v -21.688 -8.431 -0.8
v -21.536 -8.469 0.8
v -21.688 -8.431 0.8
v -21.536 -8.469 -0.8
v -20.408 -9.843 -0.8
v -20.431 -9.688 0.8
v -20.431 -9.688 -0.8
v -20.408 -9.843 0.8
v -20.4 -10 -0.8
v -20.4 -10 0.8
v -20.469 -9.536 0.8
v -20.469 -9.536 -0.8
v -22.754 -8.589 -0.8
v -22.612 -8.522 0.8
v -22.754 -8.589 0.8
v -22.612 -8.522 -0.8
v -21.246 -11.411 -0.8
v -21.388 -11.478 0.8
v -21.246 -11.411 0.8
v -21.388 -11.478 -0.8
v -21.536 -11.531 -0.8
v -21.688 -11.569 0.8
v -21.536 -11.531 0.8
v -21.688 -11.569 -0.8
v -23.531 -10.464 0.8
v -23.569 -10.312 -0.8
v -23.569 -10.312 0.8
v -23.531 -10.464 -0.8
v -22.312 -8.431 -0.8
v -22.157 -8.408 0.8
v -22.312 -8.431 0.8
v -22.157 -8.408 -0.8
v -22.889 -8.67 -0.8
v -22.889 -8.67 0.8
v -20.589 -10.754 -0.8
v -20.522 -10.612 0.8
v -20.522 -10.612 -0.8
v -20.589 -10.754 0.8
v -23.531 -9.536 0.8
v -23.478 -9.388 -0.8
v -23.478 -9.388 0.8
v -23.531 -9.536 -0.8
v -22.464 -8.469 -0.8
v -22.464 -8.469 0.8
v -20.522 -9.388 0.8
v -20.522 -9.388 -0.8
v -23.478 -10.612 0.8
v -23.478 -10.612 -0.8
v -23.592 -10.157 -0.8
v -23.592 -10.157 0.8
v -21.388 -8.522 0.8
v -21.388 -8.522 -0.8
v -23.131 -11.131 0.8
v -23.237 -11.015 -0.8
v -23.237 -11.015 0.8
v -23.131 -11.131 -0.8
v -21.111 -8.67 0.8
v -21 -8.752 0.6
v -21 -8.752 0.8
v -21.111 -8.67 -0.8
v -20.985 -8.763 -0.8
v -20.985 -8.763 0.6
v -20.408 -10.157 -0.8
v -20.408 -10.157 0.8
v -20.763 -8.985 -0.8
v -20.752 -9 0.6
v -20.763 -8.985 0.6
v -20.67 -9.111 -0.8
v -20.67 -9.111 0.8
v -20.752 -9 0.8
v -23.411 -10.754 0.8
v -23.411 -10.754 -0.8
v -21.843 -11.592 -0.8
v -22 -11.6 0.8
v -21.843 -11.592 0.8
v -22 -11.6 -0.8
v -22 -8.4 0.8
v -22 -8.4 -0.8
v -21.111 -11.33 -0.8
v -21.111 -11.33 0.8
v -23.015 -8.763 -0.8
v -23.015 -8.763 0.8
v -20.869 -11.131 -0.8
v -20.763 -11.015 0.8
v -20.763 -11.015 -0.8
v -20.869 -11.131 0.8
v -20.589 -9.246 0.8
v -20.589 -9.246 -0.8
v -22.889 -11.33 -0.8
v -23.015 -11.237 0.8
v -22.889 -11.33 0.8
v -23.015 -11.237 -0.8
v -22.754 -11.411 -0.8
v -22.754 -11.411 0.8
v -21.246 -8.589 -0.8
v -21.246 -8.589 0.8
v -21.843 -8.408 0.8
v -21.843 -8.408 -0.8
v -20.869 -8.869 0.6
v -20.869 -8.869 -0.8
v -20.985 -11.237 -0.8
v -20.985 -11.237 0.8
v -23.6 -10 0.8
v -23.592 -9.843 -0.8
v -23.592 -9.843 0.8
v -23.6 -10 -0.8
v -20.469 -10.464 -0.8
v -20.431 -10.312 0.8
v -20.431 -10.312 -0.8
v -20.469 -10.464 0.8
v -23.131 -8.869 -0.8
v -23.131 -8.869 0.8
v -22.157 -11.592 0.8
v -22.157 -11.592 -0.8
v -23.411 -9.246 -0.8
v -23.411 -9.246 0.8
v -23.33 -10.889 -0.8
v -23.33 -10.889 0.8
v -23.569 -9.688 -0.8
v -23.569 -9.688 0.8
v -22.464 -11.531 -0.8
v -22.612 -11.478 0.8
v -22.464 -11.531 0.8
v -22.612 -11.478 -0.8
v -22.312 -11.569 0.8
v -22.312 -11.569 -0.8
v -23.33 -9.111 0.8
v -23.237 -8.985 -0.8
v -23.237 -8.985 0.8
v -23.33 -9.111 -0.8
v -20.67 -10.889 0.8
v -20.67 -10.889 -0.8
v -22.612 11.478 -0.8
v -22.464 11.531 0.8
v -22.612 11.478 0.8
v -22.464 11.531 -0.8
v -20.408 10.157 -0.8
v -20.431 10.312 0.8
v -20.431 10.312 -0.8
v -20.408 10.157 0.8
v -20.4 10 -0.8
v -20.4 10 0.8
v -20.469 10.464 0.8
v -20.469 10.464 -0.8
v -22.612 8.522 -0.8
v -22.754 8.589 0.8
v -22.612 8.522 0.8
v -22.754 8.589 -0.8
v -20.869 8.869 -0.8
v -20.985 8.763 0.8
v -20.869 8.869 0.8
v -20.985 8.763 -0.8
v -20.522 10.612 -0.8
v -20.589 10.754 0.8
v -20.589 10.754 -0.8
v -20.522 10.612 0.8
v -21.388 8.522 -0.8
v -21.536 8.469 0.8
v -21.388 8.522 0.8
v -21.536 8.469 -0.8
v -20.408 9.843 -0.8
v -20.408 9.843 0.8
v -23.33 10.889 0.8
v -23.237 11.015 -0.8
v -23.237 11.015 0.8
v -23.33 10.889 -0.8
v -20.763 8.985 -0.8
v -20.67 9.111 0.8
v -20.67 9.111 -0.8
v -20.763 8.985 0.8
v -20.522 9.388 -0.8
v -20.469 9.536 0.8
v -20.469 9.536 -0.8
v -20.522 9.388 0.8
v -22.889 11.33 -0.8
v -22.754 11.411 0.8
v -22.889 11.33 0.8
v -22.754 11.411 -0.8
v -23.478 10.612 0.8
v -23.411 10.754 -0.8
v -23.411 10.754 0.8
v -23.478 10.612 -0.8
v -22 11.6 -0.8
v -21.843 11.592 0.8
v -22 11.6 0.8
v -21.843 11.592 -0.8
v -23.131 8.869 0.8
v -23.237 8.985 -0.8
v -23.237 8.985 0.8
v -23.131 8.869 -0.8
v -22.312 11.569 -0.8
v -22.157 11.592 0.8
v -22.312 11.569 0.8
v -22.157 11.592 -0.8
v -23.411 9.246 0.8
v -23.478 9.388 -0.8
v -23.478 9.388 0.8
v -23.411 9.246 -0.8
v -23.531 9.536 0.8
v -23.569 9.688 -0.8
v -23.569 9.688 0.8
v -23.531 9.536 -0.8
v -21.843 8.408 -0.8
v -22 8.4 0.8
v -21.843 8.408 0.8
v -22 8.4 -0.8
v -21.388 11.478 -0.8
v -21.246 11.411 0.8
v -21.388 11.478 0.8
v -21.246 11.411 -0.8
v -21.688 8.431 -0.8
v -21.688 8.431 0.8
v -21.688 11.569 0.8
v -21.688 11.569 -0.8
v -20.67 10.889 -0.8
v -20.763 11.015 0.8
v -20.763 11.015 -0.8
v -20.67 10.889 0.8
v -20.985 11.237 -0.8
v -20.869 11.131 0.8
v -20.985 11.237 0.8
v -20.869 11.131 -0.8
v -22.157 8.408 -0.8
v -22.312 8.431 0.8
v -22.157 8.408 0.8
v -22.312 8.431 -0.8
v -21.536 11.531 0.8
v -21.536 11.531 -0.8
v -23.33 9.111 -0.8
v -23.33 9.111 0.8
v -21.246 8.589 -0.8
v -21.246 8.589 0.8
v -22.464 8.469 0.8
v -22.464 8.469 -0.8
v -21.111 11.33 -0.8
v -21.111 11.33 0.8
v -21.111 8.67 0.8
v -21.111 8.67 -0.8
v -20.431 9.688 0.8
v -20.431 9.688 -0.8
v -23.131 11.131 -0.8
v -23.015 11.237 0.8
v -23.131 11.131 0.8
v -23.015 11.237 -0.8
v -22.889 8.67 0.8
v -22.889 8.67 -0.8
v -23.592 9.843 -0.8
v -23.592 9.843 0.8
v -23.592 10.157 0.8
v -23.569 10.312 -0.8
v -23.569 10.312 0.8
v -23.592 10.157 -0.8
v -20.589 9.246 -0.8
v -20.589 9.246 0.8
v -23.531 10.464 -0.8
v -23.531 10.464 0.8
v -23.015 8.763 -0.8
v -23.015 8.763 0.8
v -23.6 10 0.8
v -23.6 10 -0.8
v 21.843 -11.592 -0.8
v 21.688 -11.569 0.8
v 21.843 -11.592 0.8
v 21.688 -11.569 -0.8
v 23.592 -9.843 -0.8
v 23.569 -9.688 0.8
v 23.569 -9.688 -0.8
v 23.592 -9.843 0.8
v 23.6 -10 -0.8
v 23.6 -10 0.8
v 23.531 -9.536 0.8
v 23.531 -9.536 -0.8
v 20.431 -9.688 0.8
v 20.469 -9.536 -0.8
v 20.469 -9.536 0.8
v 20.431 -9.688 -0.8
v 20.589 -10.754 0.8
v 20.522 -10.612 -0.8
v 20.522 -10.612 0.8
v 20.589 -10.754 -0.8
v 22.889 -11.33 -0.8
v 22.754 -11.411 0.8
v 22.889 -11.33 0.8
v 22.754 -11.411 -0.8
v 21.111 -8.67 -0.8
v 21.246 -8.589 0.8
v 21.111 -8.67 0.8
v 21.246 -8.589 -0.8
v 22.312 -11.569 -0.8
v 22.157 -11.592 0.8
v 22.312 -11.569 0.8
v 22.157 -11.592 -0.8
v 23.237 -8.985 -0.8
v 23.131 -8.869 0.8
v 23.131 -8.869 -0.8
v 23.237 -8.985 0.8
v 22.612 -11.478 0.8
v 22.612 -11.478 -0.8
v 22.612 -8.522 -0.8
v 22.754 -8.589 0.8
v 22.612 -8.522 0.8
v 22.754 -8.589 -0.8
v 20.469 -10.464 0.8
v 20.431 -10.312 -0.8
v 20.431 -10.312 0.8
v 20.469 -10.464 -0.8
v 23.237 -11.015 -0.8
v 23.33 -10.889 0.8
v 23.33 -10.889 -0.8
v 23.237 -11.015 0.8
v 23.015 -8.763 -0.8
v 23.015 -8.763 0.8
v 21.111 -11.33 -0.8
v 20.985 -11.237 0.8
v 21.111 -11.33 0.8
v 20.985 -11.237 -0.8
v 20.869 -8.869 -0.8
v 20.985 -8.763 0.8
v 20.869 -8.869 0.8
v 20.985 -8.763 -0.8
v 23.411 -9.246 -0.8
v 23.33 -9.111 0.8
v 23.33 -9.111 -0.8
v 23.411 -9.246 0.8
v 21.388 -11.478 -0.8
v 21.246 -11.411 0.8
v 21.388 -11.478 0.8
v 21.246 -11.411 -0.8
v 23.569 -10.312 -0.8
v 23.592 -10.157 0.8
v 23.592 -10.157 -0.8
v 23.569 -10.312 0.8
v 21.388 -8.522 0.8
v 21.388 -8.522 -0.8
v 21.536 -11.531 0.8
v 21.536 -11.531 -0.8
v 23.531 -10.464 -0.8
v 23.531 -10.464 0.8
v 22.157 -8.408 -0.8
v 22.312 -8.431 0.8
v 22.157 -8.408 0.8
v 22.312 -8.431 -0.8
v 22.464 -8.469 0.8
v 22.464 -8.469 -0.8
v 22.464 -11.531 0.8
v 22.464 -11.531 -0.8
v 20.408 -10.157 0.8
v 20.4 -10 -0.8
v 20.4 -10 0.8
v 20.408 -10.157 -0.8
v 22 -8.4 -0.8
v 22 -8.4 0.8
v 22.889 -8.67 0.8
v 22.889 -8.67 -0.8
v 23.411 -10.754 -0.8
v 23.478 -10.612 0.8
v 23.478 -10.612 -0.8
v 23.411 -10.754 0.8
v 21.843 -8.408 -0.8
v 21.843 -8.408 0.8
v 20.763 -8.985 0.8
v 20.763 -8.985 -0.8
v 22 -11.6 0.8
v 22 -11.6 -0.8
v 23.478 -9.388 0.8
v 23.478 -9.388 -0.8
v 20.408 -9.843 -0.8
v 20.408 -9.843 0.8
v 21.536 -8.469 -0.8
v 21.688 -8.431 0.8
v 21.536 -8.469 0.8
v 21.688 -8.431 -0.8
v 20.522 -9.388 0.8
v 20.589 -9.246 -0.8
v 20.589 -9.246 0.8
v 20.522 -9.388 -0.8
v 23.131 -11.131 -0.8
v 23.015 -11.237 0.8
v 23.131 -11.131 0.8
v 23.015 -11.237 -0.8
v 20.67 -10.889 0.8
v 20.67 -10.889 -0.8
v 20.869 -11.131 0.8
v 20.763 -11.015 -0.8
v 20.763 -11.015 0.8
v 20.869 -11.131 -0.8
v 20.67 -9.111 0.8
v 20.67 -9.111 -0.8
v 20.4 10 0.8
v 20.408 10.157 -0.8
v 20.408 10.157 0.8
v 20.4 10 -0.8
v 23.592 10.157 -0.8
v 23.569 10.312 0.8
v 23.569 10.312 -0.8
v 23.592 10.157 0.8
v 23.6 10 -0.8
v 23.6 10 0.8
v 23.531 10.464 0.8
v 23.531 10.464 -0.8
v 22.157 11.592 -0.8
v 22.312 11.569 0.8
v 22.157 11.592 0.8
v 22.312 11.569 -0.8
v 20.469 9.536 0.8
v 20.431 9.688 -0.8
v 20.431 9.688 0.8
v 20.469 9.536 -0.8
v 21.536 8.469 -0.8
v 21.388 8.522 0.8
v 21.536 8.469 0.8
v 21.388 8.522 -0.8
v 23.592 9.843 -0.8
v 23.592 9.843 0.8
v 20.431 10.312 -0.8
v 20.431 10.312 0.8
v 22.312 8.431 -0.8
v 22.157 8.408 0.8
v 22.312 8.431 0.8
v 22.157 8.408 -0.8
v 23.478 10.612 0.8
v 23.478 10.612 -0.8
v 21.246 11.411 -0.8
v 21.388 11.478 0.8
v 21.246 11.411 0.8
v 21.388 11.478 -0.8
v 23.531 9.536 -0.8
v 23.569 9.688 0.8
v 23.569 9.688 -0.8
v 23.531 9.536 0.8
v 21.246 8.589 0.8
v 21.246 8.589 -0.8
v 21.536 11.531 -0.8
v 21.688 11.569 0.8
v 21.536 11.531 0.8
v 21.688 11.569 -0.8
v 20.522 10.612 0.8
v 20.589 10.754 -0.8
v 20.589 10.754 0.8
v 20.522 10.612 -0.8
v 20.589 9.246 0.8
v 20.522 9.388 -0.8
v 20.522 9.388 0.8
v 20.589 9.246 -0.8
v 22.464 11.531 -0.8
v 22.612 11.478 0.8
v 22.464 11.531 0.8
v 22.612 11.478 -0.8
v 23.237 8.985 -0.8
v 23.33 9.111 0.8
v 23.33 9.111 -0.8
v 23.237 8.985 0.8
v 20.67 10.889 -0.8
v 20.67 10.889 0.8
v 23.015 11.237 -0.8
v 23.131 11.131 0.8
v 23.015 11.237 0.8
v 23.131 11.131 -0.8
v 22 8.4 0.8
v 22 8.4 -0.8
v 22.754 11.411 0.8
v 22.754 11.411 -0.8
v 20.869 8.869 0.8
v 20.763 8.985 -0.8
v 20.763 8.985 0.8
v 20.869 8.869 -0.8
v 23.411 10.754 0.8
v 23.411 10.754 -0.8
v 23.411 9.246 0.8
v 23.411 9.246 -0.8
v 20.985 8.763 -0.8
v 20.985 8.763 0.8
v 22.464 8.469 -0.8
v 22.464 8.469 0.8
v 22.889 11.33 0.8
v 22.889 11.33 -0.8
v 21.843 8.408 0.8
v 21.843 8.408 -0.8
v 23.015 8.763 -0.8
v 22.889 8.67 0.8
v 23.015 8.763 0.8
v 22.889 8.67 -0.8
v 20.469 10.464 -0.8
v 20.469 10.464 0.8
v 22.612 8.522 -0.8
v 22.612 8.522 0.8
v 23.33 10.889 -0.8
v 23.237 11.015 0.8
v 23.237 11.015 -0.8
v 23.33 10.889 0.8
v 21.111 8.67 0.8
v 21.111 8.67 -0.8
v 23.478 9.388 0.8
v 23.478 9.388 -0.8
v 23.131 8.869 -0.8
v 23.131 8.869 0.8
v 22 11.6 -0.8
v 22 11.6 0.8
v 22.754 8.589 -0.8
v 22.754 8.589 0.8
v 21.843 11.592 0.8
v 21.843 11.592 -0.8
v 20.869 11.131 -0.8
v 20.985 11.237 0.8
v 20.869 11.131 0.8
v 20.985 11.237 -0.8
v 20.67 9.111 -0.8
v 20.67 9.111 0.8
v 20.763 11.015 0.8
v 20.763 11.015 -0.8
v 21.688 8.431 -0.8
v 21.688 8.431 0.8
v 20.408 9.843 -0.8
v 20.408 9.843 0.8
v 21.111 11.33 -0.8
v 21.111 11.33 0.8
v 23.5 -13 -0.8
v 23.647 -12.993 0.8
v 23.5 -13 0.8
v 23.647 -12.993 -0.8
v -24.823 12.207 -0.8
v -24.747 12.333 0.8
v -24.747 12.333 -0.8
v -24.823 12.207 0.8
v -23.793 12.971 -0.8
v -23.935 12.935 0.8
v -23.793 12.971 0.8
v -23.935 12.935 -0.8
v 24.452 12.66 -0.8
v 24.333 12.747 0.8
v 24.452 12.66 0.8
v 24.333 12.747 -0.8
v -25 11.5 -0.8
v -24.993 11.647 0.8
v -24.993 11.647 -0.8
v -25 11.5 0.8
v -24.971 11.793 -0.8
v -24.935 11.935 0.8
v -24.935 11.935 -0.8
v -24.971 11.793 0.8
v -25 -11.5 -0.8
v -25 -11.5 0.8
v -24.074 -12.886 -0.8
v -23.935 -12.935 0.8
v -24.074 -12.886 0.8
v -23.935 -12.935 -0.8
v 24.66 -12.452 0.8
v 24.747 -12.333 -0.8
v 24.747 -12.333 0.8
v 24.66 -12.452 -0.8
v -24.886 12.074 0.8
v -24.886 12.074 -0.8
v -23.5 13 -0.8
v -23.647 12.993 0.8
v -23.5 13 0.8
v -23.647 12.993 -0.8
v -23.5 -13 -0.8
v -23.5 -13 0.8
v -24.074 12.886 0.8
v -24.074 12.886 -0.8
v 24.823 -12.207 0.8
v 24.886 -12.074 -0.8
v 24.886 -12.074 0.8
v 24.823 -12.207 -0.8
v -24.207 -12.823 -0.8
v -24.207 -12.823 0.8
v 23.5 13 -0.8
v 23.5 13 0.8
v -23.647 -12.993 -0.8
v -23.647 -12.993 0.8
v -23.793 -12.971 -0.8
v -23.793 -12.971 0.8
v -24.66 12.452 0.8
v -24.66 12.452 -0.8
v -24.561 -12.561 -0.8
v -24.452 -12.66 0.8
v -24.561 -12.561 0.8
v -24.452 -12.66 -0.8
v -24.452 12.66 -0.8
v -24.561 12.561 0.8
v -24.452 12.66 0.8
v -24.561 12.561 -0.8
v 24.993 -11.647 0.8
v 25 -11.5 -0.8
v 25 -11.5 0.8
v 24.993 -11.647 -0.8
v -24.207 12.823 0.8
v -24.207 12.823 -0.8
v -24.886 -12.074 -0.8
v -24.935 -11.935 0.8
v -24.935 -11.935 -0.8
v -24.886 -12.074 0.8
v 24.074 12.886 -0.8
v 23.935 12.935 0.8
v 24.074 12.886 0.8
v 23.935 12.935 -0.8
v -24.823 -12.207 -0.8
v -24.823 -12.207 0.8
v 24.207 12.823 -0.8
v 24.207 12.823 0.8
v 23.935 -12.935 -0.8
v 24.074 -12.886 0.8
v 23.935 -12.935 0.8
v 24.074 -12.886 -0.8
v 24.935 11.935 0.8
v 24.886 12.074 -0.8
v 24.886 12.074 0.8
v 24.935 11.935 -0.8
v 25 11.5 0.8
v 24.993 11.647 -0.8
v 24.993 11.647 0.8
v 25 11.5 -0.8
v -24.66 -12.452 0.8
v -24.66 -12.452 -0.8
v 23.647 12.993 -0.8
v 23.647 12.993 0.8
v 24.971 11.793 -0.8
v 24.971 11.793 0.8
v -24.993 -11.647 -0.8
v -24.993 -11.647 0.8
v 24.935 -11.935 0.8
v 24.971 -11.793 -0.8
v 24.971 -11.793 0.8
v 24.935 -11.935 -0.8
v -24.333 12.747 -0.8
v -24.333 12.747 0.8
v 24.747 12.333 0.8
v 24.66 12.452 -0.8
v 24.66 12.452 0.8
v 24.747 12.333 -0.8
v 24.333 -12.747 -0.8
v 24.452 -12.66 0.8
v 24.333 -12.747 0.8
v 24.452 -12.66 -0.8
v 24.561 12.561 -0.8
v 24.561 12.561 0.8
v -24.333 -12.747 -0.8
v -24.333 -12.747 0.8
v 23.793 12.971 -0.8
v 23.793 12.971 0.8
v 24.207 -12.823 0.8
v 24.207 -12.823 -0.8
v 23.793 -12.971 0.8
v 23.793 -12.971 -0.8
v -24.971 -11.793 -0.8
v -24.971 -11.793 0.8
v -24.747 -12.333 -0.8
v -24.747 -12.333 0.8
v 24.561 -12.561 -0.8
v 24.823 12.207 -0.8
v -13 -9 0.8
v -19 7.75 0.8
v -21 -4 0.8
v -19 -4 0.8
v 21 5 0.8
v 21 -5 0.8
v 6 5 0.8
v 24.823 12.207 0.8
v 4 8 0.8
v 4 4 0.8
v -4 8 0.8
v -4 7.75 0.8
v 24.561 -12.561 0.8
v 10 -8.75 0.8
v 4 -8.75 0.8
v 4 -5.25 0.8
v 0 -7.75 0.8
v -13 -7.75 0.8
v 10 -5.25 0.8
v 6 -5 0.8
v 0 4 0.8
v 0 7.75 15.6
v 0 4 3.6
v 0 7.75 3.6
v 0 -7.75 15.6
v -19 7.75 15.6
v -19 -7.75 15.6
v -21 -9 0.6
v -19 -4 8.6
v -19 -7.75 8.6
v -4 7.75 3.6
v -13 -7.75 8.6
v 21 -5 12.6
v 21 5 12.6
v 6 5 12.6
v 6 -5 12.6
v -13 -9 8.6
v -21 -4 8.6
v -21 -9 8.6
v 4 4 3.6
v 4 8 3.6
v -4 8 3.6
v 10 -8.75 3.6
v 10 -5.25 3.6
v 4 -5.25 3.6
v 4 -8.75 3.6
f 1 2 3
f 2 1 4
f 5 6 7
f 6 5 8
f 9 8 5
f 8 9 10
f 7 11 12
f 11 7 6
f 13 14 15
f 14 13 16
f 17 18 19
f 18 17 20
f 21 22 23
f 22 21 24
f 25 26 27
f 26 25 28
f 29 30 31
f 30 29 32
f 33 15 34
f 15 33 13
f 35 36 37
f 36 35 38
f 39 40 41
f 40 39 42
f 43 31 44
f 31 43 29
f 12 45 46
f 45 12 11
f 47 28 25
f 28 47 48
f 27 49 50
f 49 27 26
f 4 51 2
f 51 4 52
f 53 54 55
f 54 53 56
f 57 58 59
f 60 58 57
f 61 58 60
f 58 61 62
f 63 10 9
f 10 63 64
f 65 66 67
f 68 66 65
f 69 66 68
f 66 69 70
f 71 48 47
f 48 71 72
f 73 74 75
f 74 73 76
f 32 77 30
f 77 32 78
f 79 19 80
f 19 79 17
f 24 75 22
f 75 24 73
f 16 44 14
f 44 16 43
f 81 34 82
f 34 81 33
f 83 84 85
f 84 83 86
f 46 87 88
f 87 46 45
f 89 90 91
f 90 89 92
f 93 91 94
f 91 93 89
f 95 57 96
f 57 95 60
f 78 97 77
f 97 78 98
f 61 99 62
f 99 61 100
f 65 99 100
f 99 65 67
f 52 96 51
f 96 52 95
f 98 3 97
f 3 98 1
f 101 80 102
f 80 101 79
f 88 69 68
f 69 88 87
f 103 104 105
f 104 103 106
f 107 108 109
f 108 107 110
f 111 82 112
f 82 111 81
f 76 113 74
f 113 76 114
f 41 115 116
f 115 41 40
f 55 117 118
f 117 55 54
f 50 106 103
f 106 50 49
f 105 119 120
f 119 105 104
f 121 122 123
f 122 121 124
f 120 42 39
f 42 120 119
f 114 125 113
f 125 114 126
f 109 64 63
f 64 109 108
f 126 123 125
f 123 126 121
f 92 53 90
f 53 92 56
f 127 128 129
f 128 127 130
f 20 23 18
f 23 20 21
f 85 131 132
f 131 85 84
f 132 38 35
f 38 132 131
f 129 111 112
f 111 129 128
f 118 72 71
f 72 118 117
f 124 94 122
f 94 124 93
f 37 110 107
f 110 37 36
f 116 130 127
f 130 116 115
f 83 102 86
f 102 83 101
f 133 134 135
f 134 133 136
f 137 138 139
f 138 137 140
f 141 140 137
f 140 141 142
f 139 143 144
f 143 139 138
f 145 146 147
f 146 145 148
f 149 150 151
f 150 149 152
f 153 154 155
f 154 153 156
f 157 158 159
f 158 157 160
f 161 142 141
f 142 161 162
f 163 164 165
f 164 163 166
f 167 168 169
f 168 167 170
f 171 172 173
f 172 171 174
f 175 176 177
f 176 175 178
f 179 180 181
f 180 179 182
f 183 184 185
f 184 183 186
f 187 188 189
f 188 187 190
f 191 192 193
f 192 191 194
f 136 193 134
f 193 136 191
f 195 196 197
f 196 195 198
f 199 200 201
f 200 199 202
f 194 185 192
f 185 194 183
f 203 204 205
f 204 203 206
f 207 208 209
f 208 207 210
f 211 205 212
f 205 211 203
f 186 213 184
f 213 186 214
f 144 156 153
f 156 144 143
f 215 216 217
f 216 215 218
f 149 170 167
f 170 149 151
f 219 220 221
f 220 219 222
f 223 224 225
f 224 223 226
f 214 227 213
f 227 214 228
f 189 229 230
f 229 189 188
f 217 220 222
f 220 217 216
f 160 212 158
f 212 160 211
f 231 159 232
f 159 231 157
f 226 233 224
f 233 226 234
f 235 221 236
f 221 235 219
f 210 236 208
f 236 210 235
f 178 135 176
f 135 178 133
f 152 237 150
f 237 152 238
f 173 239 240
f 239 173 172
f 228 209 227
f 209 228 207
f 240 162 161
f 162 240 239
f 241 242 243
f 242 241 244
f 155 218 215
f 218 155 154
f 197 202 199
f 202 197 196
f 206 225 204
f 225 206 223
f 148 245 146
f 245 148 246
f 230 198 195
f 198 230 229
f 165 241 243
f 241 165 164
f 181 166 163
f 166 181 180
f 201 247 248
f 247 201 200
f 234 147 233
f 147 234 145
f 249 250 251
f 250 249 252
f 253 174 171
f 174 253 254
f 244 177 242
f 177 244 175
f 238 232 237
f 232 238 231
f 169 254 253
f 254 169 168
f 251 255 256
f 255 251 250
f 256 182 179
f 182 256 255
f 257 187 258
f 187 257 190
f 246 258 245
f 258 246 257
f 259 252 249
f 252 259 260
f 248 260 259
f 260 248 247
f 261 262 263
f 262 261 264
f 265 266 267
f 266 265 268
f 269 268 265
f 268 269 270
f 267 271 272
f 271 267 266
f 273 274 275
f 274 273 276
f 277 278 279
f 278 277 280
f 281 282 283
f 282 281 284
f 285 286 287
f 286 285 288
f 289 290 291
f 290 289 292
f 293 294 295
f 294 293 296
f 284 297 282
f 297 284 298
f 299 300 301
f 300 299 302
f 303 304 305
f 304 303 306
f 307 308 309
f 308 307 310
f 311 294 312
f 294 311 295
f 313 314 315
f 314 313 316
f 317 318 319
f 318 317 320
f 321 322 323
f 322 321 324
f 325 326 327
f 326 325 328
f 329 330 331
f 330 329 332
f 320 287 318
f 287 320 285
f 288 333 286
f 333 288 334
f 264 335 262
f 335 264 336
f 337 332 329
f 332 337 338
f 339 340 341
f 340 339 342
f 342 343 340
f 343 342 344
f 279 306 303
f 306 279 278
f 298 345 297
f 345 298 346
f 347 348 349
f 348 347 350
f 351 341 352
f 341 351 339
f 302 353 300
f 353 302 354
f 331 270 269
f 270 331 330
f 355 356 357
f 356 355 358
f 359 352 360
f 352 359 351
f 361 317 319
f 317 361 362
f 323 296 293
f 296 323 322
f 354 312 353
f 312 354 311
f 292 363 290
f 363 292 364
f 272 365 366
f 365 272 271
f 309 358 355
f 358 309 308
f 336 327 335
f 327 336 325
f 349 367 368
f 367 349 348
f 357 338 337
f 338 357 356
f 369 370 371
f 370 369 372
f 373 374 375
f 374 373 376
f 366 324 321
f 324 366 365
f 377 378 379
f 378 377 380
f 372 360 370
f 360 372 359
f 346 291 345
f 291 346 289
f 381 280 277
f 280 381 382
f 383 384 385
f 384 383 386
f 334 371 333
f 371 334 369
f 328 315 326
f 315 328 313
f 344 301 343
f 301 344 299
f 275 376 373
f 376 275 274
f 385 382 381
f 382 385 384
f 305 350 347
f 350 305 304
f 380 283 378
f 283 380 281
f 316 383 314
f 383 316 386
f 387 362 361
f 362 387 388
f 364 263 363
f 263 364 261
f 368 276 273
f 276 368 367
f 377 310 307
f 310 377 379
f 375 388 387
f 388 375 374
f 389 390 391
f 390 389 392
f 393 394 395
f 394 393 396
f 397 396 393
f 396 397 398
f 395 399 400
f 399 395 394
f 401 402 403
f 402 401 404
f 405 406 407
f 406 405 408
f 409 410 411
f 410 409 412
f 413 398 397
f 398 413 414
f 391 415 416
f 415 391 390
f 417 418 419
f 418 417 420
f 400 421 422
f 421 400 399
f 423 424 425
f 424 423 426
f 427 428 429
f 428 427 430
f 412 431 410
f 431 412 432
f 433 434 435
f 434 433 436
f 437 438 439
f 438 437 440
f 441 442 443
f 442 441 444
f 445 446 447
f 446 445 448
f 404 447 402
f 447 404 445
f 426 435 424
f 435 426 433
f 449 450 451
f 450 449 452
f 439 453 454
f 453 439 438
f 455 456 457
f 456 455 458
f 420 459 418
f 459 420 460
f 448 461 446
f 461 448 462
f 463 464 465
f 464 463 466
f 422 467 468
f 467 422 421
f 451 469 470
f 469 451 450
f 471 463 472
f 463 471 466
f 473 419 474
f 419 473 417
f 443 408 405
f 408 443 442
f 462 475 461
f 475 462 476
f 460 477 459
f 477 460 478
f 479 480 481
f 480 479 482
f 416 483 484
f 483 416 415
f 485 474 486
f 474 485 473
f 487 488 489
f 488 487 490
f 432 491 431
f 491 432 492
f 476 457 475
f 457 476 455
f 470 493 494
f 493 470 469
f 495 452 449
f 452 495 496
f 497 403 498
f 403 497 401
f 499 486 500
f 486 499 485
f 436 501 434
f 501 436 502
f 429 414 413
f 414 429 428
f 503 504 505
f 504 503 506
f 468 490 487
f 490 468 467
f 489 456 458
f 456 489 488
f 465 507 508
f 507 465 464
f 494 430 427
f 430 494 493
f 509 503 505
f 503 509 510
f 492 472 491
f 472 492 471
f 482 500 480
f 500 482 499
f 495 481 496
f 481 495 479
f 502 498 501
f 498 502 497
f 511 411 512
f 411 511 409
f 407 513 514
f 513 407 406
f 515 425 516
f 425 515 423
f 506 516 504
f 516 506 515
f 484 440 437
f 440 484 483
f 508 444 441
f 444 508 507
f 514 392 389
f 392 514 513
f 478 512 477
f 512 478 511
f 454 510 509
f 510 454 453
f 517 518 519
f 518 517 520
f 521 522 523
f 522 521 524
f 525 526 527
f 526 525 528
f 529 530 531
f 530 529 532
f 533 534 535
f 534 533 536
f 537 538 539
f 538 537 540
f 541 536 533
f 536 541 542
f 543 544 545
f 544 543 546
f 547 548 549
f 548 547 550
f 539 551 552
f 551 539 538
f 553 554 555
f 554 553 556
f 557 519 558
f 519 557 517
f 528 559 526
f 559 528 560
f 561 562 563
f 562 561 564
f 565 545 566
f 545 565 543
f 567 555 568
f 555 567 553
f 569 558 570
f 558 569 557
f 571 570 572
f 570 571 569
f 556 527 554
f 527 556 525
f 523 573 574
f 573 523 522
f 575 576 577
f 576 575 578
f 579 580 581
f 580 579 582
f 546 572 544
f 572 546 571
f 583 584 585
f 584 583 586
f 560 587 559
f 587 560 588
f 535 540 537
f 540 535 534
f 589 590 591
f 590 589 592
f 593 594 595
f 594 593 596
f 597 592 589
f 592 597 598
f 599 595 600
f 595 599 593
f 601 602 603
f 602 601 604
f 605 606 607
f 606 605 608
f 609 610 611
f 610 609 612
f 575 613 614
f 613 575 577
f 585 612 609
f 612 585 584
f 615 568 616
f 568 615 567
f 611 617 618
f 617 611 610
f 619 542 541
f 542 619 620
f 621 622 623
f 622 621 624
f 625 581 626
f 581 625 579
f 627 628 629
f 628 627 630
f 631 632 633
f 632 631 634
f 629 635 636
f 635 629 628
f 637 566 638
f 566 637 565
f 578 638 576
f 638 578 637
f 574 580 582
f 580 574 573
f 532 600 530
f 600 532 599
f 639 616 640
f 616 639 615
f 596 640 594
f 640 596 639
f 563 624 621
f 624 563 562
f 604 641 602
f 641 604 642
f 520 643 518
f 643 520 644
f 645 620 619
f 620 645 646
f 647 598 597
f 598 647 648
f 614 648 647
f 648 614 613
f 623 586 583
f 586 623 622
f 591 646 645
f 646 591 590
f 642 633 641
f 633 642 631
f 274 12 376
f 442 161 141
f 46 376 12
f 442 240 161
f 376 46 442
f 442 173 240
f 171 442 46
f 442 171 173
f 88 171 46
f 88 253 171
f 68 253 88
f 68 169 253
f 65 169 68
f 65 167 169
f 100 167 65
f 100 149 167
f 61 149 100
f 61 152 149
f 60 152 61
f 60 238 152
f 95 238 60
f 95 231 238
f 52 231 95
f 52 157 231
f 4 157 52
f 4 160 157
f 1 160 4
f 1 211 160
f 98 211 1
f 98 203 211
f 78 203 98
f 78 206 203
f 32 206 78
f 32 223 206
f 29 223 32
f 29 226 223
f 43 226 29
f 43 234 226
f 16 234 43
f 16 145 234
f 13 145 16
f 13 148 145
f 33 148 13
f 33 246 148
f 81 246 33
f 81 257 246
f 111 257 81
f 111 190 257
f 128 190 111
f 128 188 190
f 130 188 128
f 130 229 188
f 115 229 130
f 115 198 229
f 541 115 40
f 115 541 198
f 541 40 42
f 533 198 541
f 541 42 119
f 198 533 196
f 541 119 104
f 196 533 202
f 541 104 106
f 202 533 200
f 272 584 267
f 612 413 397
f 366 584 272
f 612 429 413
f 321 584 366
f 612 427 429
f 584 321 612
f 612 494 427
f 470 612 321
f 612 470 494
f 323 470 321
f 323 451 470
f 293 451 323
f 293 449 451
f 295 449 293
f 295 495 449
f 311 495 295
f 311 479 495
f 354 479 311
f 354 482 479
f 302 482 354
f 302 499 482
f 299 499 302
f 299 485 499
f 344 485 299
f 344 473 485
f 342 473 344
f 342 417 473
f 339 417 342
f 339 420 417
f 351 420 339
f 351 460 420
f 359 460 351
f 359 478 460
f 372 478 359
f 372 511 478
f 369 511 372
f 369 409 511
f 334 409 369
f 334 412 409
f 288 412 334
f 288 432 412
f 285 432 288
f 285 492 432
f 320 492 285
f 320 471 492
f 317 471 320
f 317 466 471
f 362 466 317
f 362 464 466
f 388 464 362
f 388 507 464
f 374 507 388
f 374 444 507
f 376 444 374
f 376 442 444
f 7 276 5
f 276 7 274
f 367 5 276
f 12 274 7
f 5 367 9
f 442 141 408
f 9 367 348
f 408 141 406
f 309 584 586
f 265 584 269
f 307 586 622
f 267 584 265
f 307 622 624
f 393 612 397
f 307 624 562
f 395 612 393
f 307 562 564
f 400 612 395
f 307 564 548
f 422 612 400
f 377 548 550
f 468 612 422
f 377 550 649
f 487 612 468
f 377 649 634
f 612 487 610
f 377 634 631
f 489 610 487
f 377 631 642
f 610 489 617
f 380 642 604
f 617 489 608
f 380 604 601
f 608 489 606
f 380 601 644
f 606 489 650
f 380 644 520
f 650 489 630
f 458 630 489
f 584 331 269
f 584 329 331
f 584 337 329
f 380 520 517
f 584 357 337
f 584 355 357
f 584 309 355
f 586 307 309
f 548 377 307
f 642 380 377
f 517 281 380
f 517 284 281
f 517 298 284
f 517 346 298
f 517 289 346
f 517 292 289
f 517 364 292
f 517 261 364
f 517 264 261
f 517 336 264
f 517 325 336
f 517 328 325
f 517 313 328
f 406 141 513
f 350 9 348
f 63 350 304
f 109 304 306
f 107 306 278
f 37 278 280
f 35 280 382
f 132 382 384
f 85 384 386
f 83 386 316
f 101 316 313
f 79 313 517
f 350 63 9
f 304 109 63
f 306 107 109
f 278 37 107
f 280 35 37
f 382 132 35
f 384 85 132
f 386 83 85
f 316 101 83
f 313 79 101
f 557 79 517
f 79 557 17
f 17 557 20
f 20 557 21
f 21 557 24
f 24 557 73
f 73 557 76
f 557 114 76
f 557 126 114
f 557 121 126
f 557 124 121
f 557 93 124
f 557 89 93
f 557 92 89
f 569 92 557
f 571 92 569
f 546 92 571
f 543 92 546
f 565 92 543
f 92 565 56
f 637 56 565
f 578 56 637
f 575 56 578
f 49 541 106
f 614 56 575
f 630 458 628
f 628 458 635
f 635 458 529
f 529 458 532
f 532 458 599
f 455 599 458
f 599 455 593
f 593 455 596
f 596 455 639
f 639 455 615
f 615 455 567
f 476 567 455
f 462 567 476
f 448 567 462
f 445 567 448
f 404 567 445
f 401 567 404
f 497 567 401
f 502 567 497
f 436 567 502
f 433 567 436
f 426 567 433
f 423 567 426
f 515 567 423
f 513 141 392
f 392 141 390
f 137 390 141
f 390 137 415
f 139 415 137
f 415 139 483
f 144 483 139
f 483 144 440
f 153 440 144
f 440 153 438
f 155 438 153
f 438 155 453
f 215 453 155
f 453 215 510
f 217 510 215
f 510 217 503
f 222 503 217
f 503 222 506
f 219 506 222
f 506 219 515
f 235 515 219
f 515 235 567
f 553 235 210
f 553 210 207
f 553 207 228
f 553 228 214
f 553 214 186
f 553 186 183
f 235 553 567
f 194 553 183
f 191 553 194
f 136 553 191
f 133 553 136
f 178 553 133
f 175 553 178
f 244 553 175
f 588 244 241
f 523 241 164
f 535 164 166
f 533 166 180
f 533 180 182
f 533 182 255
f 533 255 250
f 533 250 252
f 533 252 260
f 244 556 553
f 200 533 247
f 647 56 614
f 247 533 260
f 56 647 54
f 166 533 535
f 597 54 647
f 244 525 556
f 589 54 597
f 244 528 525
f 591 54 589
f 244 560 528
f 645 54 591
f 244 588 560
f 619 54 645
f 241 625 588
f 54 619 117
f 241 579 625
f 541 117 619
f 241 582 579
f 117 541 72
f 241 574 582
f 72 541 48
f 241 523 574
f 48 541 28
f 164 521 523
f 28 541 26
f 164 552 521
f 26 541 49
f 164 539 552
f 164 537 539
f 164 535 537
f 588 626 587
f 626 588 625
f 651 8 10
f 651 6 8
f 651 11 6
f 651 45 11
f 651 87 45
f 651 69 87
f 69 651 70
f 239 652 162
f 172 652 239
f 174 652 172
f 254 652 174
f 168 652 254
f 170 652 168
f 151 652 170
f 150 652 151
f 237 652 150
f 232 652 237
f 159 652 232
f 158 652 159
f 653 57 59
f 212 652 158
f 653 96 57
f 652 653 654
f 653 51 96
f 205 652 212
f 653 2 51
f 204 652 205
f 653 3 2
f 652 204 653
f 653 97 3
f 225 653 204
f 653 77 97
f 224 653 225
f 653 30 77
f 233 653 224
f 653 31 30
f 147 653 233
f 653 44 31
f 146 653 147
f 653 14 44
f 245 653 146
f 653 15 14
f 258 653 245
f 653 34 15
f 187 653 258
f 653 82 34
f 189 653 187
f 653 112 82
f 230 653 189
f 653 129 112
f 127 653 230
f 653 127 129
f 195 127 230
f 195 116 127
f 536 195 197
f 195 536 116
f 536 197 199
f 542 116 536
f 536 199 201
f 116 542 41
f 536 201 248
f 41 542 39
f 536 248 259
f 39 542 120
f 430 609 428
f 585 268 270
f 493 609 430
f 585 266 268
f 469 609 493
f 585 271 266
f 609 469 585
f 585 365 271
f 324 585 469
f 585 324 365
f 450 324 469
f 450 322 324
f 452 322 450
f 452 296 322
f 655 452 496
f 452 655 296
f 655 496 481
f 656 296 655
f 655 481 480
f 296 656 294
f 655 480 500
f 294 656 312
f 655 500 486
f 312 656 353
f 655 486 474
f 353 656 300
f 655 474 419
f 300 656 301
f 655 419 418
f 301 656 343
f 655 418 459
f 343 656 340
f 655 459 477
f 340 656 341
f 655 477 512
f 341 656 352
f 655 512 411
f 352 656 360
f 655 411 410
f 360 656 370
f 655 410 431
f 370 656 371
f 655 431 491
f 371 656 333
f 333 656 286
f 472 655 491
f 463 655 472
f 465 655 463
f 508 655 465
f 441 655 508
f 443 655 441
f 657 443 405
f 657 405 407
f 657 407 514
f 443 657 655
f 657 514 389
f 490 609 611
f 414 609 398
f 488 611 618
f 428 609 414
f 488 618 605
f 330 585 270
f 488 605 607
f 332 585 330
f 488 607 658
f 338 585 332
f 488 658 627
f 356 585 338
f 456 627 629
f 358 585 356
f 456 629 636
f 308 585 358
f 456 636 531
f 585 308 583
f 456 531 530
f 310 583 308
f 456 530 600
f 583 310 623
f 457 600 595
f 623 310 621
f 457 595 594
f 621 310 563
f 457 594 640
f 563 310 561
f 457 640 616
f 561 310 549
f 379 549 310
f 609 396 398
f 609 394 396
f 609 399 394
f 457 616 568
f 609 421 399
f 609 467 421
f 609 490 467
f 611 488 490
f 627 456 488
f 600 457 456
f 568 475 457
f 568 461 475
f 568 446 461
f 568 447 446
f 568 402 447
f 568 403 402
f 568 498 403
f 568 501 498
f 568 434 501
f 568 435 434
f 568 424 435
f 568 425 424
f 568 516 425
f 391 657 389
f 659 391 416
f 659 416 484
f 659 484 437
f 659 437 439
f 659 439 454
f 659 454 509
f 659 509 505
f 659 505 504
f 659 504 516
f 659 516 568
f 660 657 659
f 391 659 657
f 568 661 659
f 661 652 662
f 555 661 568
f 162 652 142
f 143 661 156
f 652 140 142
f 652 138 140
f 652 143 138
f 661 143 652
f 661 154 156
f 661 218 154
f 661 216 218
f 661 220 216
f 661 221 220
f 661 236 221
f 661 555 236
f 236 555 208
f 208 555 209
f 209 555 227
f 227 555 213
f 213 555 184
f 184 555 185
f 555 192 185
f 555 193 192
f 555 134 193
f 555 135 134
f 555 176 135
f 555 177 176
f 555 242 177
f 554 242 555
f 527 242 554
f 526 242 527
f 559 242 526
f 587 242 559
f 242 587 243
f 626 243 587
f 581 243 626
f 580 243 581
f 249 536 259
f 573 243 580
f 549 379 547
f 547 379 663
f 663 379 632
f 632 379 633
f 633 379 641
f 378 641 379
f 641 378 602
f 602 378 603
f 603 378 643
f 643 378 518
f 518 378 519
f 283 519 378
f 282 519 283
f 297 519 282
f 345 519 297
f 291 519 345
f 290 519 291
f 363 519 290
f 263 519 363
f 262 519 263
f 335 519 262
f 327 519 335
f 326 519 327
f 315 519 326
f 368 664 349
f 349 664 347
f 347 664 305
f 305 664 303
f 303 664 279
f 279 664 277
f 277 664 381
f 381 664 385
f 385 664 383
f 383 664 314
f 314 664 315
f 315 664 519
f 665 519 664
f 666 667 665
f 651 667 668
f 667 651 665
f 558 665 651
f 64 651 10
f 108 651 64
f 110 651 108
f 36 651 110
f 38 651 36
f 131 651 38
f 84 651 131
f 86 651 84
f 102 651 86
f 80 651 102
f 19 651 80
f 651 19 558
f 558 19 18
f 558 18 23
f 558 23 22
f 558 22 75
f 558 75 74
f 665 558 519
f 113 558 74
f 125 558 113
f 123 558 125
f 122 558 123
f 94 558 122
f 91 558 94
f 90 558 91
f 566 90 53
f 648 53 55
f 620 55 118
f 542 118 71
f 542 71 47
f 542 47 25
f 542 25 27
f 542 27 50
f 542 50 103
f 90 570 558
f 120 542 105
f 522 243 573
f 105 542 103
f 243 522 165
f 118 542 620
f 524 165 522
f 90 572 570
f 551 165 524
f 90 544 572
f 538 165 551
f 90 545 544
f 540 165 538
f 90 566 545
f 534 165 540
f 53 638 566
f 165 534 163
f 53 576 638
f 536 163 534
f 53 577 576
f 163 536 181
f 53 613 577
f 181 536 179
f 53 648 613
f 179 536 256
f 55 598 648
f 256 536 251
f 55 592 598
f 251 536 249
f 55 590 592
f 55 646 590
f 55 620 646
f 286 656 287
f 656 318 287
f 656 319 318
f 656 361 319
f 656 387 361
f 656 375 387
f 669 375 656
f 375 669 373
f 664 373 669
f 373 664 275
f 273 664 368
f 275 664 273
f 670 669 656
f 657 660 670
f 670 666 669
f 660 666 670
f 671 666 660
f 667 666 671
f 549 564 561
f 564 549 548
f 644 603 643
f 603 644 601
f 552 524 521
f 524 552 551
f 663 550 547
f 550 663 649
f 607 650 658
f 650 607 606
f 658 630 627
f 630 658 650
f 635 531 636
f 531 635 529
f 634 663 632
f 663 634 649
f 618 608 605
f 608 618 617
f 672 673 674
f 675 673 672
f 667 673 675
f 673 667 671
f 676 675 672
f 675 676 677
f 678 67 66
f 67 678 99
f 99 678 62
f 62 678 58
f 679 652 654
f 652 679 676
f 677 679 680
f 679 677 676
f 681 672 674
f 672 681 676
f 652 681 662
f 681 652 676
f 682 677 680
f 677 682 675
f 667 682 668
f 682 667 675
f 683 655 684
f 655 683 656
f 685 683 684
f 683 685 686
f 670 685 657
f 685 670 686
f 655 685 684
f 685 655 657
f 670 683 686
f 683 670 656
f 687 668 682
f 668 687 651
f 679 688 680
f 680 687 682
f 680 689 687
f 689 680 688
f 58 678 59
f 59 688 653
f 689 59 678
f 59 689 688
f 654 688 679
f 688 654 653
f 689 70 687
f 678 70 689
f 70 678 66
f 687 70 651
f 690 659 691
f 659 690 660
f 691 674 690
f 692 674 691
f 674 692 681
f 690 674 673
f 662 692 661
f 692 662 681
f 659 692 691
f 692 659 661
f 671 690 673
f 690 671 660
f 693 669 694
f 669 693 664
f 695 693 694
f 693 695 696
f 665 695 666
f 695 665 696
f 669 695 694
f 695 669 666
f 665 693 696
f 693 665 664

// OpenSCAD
$fn = 64;

// Relay module overall PCB size (mm)
length = 50.0;
width  = 26.0;
thick  = 1.6;

eps = 0.2; // small overlap to guarantee connectivity

module rounded_rect_2d(l, w, r) {
    r2 = min(r, min(l, w)/2);
    offset(r=r2) offset(delta=-r2) square([l, w], center=true);
}

module relay_module(l=length, w=width, t=thick) {

    // --- PCB ---
    pcb_r = 1.5;

    // --- Mounting holes (4-corner) ---
    hole_d = 3.2;
    hole_edge_x = 3.0;
    hole_edge_y = 3.0;
    hole_x = l/2 - hole_edge_x;
    hole_y = w/2 - hole_edge_y;

    // --- Relay body (approx) ---
    relay_l = 19.0;
    relay_w = 15.5;
    relay_h = 15.0;
    relay_x = -l/2 + 6.0 + relay_l/2; // near left side
    relay_y = 0;

    // --- Screw terminal block (approx) ---
    term_l = 15.0;
    term_w = 10.0;
    term_h = 12.0;
    term_x =  l/2 - 4.0 - term_l/2;   // near right edge
    term_y =  0;

    // --- Pin header block (approx, 3-pin) ---
    hdr_l = 8.0;
    hdr_w = 5.0;
    hdr_h = 8.0;
    hdr_x = -l/2 + 4.0 + hdr_l/2;     // near left edge
    hdr_y = -w/2 + 4.0 + hdr_w/2;     // near bottom edge

    // --- Small components (approx) ---
    comp_h = 3.0;
    comp1_l = 8.0; comp1_w = 4.0;
    comp2_l = 6.0; comp2_w = 3.5;

    comp1_x = 0;
    comp1_y =  w/2 - 5.0 - comp1_w/2;

    comp2_x =  l/2 - 18.0;
    comp2_y = -w/2 + 6.0;

    union() {
        // PCB with holes (centered in Z so orthographic views show thickness correctly)
        difference() {
            translate([0, 0, -t/2])
                linear_extrude(height=t)
                    rounded_rect_2d(l, w, pcb_r);

            for (sx = [-1, 1], sy = [-1, 1])
                translate([sx*hole_x, sy*hole_y, -t/2 - 1])
                    cylinder(d=hole_d, h=t+2);
        }

        // Place all top-side parts so their bottoms overlap slightly into the PCB top surface at z=+t/2
        translate([relay_x, relay_y, t/2 + relay_h/2 - eps])
            cube([relay_l, relay_w, relay_h], center=true);

        translate([term_x, term_y, t/2 + term_h/2 - eps])
            cube([term_l, term_w, term_h], center=true);

        translate([hdr_x, hdr_y, t/2 + hdr_h/2 - eps])
            cube([hdr_l, hdr_w, hdr_h], center=true);

        translate([comp1_x, comp1_y, t/2 + comp_h/2 - eps])
            cube([comp1_l, comp1_w, comp_h], center=true);

        translate([comp2_x, comp2_y, t/2 + comp_h/2 - eps])
            cube([comp2_l, comp2_w, comp_h], center=true);
    }
}

relay_module();
